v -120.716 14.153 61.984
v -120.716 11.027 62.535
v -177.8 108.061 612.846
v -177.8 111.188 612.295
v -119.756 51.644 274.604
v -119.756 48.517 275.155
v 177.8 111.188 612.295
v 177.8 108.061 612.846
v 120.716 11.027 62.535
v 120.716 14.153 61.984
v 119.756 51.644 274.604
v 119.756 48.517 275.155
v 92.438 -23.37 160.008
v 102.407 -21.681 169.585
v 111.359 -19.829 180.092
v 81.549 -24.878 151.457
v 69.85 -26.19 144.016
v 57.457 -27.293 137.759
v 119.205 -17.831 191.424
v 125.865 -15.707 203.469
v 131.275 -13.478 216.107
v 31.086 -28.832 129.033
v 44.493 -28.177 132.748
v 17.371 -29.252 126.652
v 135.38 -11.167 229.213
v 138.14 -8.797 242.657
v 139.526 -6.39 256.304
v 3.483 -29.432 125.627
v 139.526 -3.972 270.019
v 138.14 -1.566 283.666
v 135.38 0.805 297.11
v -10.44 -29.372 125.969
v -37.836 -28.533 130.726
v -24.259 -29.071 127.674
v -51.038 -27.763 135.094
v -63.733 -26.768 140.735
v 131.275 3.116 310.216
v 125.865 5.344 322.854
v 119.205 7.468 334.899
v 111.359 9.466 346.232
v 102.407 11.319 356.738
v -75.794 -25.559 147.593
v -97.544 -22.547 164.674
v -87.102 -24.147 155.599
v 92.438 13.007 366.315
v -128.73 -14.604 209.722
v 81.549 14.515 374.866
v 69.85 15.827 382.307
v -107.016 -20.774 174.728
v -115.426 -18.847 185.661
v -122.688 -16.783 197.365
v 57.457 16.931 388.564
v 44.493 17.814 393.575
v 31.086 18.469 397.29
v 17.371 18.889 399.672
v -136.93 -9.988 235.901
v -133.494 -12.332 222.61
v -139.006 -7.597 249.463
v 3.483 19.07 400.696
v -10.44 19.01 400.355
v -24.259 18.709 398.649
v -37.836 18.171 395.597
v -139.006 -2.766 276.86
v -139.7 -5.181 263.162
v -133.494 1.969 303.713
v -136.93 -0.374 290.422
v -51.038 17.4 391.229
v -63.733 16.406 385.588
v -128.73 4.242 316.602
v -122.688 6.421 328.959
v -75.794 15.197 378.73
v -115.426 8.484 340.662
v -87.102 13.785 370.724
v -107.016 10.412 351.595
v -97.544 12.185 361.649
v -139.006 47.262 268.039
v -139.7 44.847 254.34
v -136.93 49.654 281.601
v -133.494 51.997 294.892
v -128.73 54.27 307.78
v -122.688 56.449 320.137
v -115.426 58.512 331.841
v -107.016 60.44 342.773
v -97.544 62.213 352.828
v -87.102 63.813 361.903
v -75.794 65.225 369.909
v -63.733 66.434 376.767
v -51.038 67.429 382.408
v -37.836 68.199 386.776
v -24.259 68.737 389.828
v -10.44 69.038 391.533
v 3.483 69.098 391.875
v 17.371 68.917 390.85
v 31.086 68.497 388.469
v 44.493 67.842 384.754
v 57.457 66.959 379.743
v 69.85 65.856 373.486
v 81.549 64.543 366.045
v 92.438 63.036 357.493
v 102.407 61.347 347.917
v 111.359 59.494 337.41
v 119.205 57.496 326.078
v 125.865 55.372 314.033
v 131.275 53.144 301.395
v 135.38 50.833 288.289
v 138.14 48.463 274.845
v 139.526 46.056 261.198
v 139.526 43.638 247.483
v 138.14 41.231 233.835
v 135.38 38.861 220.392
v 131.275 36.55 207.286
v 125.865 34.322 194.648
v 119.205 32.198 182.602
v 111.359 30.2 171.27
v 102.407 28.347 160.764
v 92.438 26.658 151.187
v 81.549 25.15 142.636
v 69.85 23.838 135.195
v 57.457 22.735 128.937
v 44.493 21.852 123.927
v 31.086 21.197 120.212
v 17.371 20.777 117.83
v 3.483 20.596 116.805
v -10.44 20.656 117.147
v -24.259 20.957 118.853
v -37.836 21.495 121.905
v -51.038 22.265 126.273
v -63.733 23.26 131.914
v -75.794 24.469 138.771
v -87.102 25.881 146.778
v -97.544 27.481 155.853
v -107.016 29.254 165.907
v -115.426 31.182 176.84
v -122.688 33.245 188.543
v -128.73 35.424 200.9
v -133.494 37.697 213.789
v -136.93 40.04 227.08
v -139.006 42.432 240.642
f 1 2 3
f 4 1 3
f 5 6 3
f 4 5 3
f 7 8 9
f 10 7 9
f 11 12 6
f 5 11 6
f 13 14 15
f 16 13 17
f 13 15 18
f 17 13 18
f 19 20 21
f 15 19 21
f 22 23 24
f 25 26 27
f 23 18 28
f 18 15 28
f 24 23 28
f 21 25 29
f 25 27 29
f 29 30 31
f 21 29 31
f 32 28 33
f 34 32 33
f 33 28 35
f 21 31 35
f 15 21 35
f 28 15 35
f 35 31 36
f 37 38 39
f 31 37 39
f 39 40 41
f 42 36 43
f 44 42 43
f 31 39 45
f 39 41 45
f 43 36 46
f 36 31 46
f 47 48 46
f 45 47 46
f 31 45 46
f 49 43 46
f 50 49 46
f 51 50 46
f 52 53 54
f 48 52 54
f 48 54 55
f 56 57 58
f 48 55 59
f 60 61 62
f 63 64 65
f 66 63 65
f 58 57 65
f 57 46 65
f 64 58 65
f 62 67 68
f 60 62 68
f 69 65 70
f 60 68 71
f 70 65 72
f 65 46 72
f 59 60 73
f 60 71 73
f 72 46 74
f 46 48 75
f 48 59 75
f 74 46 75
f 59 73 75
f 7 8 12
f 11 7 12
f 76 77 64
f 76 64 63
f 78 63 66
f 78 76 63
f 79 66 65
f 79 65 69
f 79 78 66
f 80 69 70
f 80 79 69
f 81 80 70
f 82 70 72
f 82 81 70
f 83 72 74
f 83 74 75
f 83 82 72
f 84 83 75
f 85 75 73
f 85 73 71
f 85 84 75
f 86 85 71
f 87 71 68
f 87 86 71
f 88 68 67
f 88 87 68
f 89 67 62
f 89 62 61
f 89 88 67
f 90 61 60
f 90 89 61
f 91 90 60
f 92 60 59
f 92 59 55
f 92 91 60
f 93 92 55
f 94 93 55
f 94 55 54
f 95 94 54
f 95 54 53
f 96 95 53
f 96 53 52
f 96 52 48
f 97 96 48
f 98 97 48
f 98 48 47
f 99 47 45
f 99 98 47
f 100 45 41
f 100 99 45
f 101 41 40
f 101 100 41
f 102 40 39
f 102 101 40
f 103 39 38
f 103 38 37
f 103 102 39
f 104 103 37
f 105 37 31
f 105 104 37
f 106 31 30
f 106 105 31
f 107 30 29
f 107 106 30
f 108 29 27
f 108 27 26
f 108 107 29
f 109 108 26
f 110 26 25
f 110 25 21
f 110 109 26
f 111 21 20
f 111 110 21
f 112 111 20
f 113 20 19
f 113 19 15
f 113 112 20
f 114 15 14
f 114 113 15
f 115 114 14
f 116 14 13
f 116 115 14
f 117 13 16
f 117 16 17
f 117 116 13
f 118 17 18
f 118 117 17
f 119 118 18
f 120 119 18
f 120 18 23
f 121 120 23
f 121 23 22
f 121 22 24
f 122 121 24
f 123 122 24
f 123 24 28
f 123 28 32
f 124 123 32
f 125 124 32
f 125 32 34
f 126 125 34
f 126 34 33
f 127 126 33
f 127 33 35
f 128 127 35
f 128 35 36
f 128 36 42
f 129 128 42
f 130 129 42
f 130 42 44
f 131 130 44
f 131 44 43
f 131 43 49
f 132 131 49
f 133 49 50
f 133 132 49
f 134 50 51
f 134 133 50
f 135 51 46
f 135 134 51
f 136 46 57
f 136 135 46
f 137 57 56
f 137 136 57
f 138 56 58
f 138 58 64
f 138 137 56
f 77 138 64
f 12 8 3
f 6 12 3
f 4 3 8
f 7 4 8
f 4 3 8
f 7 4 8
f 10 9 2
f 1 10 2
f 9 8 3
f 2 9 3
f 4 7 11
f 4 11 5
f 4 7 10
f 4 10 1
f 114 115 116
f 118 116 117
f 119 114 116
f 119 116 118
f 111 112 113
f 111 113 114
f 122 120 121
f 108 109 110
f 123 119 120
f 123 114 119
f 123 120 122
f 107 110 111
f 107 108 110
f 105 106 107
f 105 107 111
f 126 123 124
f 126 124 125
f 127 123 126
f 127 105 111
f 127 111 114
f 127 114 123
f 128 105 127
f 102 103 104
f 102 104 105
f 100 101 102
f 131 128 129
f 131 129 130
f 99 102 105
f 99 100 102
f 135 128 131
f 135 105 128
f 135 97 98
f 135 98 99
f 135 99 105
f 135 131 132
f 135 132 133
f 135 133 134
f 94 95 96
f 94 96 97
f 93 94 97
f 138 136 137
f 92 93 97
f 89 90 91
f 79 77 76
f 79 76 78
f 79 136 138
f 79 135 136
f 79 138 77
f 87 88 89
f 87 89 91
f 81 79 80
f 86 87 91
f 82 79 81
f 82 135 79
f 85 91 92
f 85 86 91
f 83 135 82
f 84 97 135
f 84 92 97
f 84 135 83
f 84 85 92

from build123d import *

# Parameters (mm, degrees)
F4_DEPTH = 3.175
F6_DEPTH = 3.175
F7_R     = 139.7
F8_DEPTH = 50.8


with BuildPart() as f4:
    # F3 (on face) → F4 (new body)
    with BuildSketch(Plane(origin=(0, 0, 0), x_dir=(-1, 0, 0), z_dir=(0, 0.984808, -0.173648))):
        Polygon((120.716058, 63.5), (177.8, 622.3), (-177.8, 622.3), (-120.716058, 63.5), align=None)
    extrude(amount=F4_DEPTH)


with BuildPart() as f6:
    # F5 (on face) → F6 (new body)
    with BuildSketch(Plane(origin=(0, 0, 0), x_dir=(-1, 0, 0), z_dir=(0, 0.984808, -0.173648))):
        Polygon((119.756252, 279.4), (177.8, 622.3), (-177.8, 622.3), (-119.756252, 279.4), align=None)
    extrude(amount=F6_DEPTH)


with BuildPart() as f8:
    # F7 (on face) → F8 (new body)
    with BuildSketch(Plane(origin=(0, 0, 0), x_dir=(-1, 0, 0), z_dir=(0, 0.984808, -0.173648))):
        with Locations((0, 258.263856)):
            Circle(F7_R)
    extrude(amount=-F8_DEPTH)


solid = Compound([f4.part, f6.part, f8.part])
